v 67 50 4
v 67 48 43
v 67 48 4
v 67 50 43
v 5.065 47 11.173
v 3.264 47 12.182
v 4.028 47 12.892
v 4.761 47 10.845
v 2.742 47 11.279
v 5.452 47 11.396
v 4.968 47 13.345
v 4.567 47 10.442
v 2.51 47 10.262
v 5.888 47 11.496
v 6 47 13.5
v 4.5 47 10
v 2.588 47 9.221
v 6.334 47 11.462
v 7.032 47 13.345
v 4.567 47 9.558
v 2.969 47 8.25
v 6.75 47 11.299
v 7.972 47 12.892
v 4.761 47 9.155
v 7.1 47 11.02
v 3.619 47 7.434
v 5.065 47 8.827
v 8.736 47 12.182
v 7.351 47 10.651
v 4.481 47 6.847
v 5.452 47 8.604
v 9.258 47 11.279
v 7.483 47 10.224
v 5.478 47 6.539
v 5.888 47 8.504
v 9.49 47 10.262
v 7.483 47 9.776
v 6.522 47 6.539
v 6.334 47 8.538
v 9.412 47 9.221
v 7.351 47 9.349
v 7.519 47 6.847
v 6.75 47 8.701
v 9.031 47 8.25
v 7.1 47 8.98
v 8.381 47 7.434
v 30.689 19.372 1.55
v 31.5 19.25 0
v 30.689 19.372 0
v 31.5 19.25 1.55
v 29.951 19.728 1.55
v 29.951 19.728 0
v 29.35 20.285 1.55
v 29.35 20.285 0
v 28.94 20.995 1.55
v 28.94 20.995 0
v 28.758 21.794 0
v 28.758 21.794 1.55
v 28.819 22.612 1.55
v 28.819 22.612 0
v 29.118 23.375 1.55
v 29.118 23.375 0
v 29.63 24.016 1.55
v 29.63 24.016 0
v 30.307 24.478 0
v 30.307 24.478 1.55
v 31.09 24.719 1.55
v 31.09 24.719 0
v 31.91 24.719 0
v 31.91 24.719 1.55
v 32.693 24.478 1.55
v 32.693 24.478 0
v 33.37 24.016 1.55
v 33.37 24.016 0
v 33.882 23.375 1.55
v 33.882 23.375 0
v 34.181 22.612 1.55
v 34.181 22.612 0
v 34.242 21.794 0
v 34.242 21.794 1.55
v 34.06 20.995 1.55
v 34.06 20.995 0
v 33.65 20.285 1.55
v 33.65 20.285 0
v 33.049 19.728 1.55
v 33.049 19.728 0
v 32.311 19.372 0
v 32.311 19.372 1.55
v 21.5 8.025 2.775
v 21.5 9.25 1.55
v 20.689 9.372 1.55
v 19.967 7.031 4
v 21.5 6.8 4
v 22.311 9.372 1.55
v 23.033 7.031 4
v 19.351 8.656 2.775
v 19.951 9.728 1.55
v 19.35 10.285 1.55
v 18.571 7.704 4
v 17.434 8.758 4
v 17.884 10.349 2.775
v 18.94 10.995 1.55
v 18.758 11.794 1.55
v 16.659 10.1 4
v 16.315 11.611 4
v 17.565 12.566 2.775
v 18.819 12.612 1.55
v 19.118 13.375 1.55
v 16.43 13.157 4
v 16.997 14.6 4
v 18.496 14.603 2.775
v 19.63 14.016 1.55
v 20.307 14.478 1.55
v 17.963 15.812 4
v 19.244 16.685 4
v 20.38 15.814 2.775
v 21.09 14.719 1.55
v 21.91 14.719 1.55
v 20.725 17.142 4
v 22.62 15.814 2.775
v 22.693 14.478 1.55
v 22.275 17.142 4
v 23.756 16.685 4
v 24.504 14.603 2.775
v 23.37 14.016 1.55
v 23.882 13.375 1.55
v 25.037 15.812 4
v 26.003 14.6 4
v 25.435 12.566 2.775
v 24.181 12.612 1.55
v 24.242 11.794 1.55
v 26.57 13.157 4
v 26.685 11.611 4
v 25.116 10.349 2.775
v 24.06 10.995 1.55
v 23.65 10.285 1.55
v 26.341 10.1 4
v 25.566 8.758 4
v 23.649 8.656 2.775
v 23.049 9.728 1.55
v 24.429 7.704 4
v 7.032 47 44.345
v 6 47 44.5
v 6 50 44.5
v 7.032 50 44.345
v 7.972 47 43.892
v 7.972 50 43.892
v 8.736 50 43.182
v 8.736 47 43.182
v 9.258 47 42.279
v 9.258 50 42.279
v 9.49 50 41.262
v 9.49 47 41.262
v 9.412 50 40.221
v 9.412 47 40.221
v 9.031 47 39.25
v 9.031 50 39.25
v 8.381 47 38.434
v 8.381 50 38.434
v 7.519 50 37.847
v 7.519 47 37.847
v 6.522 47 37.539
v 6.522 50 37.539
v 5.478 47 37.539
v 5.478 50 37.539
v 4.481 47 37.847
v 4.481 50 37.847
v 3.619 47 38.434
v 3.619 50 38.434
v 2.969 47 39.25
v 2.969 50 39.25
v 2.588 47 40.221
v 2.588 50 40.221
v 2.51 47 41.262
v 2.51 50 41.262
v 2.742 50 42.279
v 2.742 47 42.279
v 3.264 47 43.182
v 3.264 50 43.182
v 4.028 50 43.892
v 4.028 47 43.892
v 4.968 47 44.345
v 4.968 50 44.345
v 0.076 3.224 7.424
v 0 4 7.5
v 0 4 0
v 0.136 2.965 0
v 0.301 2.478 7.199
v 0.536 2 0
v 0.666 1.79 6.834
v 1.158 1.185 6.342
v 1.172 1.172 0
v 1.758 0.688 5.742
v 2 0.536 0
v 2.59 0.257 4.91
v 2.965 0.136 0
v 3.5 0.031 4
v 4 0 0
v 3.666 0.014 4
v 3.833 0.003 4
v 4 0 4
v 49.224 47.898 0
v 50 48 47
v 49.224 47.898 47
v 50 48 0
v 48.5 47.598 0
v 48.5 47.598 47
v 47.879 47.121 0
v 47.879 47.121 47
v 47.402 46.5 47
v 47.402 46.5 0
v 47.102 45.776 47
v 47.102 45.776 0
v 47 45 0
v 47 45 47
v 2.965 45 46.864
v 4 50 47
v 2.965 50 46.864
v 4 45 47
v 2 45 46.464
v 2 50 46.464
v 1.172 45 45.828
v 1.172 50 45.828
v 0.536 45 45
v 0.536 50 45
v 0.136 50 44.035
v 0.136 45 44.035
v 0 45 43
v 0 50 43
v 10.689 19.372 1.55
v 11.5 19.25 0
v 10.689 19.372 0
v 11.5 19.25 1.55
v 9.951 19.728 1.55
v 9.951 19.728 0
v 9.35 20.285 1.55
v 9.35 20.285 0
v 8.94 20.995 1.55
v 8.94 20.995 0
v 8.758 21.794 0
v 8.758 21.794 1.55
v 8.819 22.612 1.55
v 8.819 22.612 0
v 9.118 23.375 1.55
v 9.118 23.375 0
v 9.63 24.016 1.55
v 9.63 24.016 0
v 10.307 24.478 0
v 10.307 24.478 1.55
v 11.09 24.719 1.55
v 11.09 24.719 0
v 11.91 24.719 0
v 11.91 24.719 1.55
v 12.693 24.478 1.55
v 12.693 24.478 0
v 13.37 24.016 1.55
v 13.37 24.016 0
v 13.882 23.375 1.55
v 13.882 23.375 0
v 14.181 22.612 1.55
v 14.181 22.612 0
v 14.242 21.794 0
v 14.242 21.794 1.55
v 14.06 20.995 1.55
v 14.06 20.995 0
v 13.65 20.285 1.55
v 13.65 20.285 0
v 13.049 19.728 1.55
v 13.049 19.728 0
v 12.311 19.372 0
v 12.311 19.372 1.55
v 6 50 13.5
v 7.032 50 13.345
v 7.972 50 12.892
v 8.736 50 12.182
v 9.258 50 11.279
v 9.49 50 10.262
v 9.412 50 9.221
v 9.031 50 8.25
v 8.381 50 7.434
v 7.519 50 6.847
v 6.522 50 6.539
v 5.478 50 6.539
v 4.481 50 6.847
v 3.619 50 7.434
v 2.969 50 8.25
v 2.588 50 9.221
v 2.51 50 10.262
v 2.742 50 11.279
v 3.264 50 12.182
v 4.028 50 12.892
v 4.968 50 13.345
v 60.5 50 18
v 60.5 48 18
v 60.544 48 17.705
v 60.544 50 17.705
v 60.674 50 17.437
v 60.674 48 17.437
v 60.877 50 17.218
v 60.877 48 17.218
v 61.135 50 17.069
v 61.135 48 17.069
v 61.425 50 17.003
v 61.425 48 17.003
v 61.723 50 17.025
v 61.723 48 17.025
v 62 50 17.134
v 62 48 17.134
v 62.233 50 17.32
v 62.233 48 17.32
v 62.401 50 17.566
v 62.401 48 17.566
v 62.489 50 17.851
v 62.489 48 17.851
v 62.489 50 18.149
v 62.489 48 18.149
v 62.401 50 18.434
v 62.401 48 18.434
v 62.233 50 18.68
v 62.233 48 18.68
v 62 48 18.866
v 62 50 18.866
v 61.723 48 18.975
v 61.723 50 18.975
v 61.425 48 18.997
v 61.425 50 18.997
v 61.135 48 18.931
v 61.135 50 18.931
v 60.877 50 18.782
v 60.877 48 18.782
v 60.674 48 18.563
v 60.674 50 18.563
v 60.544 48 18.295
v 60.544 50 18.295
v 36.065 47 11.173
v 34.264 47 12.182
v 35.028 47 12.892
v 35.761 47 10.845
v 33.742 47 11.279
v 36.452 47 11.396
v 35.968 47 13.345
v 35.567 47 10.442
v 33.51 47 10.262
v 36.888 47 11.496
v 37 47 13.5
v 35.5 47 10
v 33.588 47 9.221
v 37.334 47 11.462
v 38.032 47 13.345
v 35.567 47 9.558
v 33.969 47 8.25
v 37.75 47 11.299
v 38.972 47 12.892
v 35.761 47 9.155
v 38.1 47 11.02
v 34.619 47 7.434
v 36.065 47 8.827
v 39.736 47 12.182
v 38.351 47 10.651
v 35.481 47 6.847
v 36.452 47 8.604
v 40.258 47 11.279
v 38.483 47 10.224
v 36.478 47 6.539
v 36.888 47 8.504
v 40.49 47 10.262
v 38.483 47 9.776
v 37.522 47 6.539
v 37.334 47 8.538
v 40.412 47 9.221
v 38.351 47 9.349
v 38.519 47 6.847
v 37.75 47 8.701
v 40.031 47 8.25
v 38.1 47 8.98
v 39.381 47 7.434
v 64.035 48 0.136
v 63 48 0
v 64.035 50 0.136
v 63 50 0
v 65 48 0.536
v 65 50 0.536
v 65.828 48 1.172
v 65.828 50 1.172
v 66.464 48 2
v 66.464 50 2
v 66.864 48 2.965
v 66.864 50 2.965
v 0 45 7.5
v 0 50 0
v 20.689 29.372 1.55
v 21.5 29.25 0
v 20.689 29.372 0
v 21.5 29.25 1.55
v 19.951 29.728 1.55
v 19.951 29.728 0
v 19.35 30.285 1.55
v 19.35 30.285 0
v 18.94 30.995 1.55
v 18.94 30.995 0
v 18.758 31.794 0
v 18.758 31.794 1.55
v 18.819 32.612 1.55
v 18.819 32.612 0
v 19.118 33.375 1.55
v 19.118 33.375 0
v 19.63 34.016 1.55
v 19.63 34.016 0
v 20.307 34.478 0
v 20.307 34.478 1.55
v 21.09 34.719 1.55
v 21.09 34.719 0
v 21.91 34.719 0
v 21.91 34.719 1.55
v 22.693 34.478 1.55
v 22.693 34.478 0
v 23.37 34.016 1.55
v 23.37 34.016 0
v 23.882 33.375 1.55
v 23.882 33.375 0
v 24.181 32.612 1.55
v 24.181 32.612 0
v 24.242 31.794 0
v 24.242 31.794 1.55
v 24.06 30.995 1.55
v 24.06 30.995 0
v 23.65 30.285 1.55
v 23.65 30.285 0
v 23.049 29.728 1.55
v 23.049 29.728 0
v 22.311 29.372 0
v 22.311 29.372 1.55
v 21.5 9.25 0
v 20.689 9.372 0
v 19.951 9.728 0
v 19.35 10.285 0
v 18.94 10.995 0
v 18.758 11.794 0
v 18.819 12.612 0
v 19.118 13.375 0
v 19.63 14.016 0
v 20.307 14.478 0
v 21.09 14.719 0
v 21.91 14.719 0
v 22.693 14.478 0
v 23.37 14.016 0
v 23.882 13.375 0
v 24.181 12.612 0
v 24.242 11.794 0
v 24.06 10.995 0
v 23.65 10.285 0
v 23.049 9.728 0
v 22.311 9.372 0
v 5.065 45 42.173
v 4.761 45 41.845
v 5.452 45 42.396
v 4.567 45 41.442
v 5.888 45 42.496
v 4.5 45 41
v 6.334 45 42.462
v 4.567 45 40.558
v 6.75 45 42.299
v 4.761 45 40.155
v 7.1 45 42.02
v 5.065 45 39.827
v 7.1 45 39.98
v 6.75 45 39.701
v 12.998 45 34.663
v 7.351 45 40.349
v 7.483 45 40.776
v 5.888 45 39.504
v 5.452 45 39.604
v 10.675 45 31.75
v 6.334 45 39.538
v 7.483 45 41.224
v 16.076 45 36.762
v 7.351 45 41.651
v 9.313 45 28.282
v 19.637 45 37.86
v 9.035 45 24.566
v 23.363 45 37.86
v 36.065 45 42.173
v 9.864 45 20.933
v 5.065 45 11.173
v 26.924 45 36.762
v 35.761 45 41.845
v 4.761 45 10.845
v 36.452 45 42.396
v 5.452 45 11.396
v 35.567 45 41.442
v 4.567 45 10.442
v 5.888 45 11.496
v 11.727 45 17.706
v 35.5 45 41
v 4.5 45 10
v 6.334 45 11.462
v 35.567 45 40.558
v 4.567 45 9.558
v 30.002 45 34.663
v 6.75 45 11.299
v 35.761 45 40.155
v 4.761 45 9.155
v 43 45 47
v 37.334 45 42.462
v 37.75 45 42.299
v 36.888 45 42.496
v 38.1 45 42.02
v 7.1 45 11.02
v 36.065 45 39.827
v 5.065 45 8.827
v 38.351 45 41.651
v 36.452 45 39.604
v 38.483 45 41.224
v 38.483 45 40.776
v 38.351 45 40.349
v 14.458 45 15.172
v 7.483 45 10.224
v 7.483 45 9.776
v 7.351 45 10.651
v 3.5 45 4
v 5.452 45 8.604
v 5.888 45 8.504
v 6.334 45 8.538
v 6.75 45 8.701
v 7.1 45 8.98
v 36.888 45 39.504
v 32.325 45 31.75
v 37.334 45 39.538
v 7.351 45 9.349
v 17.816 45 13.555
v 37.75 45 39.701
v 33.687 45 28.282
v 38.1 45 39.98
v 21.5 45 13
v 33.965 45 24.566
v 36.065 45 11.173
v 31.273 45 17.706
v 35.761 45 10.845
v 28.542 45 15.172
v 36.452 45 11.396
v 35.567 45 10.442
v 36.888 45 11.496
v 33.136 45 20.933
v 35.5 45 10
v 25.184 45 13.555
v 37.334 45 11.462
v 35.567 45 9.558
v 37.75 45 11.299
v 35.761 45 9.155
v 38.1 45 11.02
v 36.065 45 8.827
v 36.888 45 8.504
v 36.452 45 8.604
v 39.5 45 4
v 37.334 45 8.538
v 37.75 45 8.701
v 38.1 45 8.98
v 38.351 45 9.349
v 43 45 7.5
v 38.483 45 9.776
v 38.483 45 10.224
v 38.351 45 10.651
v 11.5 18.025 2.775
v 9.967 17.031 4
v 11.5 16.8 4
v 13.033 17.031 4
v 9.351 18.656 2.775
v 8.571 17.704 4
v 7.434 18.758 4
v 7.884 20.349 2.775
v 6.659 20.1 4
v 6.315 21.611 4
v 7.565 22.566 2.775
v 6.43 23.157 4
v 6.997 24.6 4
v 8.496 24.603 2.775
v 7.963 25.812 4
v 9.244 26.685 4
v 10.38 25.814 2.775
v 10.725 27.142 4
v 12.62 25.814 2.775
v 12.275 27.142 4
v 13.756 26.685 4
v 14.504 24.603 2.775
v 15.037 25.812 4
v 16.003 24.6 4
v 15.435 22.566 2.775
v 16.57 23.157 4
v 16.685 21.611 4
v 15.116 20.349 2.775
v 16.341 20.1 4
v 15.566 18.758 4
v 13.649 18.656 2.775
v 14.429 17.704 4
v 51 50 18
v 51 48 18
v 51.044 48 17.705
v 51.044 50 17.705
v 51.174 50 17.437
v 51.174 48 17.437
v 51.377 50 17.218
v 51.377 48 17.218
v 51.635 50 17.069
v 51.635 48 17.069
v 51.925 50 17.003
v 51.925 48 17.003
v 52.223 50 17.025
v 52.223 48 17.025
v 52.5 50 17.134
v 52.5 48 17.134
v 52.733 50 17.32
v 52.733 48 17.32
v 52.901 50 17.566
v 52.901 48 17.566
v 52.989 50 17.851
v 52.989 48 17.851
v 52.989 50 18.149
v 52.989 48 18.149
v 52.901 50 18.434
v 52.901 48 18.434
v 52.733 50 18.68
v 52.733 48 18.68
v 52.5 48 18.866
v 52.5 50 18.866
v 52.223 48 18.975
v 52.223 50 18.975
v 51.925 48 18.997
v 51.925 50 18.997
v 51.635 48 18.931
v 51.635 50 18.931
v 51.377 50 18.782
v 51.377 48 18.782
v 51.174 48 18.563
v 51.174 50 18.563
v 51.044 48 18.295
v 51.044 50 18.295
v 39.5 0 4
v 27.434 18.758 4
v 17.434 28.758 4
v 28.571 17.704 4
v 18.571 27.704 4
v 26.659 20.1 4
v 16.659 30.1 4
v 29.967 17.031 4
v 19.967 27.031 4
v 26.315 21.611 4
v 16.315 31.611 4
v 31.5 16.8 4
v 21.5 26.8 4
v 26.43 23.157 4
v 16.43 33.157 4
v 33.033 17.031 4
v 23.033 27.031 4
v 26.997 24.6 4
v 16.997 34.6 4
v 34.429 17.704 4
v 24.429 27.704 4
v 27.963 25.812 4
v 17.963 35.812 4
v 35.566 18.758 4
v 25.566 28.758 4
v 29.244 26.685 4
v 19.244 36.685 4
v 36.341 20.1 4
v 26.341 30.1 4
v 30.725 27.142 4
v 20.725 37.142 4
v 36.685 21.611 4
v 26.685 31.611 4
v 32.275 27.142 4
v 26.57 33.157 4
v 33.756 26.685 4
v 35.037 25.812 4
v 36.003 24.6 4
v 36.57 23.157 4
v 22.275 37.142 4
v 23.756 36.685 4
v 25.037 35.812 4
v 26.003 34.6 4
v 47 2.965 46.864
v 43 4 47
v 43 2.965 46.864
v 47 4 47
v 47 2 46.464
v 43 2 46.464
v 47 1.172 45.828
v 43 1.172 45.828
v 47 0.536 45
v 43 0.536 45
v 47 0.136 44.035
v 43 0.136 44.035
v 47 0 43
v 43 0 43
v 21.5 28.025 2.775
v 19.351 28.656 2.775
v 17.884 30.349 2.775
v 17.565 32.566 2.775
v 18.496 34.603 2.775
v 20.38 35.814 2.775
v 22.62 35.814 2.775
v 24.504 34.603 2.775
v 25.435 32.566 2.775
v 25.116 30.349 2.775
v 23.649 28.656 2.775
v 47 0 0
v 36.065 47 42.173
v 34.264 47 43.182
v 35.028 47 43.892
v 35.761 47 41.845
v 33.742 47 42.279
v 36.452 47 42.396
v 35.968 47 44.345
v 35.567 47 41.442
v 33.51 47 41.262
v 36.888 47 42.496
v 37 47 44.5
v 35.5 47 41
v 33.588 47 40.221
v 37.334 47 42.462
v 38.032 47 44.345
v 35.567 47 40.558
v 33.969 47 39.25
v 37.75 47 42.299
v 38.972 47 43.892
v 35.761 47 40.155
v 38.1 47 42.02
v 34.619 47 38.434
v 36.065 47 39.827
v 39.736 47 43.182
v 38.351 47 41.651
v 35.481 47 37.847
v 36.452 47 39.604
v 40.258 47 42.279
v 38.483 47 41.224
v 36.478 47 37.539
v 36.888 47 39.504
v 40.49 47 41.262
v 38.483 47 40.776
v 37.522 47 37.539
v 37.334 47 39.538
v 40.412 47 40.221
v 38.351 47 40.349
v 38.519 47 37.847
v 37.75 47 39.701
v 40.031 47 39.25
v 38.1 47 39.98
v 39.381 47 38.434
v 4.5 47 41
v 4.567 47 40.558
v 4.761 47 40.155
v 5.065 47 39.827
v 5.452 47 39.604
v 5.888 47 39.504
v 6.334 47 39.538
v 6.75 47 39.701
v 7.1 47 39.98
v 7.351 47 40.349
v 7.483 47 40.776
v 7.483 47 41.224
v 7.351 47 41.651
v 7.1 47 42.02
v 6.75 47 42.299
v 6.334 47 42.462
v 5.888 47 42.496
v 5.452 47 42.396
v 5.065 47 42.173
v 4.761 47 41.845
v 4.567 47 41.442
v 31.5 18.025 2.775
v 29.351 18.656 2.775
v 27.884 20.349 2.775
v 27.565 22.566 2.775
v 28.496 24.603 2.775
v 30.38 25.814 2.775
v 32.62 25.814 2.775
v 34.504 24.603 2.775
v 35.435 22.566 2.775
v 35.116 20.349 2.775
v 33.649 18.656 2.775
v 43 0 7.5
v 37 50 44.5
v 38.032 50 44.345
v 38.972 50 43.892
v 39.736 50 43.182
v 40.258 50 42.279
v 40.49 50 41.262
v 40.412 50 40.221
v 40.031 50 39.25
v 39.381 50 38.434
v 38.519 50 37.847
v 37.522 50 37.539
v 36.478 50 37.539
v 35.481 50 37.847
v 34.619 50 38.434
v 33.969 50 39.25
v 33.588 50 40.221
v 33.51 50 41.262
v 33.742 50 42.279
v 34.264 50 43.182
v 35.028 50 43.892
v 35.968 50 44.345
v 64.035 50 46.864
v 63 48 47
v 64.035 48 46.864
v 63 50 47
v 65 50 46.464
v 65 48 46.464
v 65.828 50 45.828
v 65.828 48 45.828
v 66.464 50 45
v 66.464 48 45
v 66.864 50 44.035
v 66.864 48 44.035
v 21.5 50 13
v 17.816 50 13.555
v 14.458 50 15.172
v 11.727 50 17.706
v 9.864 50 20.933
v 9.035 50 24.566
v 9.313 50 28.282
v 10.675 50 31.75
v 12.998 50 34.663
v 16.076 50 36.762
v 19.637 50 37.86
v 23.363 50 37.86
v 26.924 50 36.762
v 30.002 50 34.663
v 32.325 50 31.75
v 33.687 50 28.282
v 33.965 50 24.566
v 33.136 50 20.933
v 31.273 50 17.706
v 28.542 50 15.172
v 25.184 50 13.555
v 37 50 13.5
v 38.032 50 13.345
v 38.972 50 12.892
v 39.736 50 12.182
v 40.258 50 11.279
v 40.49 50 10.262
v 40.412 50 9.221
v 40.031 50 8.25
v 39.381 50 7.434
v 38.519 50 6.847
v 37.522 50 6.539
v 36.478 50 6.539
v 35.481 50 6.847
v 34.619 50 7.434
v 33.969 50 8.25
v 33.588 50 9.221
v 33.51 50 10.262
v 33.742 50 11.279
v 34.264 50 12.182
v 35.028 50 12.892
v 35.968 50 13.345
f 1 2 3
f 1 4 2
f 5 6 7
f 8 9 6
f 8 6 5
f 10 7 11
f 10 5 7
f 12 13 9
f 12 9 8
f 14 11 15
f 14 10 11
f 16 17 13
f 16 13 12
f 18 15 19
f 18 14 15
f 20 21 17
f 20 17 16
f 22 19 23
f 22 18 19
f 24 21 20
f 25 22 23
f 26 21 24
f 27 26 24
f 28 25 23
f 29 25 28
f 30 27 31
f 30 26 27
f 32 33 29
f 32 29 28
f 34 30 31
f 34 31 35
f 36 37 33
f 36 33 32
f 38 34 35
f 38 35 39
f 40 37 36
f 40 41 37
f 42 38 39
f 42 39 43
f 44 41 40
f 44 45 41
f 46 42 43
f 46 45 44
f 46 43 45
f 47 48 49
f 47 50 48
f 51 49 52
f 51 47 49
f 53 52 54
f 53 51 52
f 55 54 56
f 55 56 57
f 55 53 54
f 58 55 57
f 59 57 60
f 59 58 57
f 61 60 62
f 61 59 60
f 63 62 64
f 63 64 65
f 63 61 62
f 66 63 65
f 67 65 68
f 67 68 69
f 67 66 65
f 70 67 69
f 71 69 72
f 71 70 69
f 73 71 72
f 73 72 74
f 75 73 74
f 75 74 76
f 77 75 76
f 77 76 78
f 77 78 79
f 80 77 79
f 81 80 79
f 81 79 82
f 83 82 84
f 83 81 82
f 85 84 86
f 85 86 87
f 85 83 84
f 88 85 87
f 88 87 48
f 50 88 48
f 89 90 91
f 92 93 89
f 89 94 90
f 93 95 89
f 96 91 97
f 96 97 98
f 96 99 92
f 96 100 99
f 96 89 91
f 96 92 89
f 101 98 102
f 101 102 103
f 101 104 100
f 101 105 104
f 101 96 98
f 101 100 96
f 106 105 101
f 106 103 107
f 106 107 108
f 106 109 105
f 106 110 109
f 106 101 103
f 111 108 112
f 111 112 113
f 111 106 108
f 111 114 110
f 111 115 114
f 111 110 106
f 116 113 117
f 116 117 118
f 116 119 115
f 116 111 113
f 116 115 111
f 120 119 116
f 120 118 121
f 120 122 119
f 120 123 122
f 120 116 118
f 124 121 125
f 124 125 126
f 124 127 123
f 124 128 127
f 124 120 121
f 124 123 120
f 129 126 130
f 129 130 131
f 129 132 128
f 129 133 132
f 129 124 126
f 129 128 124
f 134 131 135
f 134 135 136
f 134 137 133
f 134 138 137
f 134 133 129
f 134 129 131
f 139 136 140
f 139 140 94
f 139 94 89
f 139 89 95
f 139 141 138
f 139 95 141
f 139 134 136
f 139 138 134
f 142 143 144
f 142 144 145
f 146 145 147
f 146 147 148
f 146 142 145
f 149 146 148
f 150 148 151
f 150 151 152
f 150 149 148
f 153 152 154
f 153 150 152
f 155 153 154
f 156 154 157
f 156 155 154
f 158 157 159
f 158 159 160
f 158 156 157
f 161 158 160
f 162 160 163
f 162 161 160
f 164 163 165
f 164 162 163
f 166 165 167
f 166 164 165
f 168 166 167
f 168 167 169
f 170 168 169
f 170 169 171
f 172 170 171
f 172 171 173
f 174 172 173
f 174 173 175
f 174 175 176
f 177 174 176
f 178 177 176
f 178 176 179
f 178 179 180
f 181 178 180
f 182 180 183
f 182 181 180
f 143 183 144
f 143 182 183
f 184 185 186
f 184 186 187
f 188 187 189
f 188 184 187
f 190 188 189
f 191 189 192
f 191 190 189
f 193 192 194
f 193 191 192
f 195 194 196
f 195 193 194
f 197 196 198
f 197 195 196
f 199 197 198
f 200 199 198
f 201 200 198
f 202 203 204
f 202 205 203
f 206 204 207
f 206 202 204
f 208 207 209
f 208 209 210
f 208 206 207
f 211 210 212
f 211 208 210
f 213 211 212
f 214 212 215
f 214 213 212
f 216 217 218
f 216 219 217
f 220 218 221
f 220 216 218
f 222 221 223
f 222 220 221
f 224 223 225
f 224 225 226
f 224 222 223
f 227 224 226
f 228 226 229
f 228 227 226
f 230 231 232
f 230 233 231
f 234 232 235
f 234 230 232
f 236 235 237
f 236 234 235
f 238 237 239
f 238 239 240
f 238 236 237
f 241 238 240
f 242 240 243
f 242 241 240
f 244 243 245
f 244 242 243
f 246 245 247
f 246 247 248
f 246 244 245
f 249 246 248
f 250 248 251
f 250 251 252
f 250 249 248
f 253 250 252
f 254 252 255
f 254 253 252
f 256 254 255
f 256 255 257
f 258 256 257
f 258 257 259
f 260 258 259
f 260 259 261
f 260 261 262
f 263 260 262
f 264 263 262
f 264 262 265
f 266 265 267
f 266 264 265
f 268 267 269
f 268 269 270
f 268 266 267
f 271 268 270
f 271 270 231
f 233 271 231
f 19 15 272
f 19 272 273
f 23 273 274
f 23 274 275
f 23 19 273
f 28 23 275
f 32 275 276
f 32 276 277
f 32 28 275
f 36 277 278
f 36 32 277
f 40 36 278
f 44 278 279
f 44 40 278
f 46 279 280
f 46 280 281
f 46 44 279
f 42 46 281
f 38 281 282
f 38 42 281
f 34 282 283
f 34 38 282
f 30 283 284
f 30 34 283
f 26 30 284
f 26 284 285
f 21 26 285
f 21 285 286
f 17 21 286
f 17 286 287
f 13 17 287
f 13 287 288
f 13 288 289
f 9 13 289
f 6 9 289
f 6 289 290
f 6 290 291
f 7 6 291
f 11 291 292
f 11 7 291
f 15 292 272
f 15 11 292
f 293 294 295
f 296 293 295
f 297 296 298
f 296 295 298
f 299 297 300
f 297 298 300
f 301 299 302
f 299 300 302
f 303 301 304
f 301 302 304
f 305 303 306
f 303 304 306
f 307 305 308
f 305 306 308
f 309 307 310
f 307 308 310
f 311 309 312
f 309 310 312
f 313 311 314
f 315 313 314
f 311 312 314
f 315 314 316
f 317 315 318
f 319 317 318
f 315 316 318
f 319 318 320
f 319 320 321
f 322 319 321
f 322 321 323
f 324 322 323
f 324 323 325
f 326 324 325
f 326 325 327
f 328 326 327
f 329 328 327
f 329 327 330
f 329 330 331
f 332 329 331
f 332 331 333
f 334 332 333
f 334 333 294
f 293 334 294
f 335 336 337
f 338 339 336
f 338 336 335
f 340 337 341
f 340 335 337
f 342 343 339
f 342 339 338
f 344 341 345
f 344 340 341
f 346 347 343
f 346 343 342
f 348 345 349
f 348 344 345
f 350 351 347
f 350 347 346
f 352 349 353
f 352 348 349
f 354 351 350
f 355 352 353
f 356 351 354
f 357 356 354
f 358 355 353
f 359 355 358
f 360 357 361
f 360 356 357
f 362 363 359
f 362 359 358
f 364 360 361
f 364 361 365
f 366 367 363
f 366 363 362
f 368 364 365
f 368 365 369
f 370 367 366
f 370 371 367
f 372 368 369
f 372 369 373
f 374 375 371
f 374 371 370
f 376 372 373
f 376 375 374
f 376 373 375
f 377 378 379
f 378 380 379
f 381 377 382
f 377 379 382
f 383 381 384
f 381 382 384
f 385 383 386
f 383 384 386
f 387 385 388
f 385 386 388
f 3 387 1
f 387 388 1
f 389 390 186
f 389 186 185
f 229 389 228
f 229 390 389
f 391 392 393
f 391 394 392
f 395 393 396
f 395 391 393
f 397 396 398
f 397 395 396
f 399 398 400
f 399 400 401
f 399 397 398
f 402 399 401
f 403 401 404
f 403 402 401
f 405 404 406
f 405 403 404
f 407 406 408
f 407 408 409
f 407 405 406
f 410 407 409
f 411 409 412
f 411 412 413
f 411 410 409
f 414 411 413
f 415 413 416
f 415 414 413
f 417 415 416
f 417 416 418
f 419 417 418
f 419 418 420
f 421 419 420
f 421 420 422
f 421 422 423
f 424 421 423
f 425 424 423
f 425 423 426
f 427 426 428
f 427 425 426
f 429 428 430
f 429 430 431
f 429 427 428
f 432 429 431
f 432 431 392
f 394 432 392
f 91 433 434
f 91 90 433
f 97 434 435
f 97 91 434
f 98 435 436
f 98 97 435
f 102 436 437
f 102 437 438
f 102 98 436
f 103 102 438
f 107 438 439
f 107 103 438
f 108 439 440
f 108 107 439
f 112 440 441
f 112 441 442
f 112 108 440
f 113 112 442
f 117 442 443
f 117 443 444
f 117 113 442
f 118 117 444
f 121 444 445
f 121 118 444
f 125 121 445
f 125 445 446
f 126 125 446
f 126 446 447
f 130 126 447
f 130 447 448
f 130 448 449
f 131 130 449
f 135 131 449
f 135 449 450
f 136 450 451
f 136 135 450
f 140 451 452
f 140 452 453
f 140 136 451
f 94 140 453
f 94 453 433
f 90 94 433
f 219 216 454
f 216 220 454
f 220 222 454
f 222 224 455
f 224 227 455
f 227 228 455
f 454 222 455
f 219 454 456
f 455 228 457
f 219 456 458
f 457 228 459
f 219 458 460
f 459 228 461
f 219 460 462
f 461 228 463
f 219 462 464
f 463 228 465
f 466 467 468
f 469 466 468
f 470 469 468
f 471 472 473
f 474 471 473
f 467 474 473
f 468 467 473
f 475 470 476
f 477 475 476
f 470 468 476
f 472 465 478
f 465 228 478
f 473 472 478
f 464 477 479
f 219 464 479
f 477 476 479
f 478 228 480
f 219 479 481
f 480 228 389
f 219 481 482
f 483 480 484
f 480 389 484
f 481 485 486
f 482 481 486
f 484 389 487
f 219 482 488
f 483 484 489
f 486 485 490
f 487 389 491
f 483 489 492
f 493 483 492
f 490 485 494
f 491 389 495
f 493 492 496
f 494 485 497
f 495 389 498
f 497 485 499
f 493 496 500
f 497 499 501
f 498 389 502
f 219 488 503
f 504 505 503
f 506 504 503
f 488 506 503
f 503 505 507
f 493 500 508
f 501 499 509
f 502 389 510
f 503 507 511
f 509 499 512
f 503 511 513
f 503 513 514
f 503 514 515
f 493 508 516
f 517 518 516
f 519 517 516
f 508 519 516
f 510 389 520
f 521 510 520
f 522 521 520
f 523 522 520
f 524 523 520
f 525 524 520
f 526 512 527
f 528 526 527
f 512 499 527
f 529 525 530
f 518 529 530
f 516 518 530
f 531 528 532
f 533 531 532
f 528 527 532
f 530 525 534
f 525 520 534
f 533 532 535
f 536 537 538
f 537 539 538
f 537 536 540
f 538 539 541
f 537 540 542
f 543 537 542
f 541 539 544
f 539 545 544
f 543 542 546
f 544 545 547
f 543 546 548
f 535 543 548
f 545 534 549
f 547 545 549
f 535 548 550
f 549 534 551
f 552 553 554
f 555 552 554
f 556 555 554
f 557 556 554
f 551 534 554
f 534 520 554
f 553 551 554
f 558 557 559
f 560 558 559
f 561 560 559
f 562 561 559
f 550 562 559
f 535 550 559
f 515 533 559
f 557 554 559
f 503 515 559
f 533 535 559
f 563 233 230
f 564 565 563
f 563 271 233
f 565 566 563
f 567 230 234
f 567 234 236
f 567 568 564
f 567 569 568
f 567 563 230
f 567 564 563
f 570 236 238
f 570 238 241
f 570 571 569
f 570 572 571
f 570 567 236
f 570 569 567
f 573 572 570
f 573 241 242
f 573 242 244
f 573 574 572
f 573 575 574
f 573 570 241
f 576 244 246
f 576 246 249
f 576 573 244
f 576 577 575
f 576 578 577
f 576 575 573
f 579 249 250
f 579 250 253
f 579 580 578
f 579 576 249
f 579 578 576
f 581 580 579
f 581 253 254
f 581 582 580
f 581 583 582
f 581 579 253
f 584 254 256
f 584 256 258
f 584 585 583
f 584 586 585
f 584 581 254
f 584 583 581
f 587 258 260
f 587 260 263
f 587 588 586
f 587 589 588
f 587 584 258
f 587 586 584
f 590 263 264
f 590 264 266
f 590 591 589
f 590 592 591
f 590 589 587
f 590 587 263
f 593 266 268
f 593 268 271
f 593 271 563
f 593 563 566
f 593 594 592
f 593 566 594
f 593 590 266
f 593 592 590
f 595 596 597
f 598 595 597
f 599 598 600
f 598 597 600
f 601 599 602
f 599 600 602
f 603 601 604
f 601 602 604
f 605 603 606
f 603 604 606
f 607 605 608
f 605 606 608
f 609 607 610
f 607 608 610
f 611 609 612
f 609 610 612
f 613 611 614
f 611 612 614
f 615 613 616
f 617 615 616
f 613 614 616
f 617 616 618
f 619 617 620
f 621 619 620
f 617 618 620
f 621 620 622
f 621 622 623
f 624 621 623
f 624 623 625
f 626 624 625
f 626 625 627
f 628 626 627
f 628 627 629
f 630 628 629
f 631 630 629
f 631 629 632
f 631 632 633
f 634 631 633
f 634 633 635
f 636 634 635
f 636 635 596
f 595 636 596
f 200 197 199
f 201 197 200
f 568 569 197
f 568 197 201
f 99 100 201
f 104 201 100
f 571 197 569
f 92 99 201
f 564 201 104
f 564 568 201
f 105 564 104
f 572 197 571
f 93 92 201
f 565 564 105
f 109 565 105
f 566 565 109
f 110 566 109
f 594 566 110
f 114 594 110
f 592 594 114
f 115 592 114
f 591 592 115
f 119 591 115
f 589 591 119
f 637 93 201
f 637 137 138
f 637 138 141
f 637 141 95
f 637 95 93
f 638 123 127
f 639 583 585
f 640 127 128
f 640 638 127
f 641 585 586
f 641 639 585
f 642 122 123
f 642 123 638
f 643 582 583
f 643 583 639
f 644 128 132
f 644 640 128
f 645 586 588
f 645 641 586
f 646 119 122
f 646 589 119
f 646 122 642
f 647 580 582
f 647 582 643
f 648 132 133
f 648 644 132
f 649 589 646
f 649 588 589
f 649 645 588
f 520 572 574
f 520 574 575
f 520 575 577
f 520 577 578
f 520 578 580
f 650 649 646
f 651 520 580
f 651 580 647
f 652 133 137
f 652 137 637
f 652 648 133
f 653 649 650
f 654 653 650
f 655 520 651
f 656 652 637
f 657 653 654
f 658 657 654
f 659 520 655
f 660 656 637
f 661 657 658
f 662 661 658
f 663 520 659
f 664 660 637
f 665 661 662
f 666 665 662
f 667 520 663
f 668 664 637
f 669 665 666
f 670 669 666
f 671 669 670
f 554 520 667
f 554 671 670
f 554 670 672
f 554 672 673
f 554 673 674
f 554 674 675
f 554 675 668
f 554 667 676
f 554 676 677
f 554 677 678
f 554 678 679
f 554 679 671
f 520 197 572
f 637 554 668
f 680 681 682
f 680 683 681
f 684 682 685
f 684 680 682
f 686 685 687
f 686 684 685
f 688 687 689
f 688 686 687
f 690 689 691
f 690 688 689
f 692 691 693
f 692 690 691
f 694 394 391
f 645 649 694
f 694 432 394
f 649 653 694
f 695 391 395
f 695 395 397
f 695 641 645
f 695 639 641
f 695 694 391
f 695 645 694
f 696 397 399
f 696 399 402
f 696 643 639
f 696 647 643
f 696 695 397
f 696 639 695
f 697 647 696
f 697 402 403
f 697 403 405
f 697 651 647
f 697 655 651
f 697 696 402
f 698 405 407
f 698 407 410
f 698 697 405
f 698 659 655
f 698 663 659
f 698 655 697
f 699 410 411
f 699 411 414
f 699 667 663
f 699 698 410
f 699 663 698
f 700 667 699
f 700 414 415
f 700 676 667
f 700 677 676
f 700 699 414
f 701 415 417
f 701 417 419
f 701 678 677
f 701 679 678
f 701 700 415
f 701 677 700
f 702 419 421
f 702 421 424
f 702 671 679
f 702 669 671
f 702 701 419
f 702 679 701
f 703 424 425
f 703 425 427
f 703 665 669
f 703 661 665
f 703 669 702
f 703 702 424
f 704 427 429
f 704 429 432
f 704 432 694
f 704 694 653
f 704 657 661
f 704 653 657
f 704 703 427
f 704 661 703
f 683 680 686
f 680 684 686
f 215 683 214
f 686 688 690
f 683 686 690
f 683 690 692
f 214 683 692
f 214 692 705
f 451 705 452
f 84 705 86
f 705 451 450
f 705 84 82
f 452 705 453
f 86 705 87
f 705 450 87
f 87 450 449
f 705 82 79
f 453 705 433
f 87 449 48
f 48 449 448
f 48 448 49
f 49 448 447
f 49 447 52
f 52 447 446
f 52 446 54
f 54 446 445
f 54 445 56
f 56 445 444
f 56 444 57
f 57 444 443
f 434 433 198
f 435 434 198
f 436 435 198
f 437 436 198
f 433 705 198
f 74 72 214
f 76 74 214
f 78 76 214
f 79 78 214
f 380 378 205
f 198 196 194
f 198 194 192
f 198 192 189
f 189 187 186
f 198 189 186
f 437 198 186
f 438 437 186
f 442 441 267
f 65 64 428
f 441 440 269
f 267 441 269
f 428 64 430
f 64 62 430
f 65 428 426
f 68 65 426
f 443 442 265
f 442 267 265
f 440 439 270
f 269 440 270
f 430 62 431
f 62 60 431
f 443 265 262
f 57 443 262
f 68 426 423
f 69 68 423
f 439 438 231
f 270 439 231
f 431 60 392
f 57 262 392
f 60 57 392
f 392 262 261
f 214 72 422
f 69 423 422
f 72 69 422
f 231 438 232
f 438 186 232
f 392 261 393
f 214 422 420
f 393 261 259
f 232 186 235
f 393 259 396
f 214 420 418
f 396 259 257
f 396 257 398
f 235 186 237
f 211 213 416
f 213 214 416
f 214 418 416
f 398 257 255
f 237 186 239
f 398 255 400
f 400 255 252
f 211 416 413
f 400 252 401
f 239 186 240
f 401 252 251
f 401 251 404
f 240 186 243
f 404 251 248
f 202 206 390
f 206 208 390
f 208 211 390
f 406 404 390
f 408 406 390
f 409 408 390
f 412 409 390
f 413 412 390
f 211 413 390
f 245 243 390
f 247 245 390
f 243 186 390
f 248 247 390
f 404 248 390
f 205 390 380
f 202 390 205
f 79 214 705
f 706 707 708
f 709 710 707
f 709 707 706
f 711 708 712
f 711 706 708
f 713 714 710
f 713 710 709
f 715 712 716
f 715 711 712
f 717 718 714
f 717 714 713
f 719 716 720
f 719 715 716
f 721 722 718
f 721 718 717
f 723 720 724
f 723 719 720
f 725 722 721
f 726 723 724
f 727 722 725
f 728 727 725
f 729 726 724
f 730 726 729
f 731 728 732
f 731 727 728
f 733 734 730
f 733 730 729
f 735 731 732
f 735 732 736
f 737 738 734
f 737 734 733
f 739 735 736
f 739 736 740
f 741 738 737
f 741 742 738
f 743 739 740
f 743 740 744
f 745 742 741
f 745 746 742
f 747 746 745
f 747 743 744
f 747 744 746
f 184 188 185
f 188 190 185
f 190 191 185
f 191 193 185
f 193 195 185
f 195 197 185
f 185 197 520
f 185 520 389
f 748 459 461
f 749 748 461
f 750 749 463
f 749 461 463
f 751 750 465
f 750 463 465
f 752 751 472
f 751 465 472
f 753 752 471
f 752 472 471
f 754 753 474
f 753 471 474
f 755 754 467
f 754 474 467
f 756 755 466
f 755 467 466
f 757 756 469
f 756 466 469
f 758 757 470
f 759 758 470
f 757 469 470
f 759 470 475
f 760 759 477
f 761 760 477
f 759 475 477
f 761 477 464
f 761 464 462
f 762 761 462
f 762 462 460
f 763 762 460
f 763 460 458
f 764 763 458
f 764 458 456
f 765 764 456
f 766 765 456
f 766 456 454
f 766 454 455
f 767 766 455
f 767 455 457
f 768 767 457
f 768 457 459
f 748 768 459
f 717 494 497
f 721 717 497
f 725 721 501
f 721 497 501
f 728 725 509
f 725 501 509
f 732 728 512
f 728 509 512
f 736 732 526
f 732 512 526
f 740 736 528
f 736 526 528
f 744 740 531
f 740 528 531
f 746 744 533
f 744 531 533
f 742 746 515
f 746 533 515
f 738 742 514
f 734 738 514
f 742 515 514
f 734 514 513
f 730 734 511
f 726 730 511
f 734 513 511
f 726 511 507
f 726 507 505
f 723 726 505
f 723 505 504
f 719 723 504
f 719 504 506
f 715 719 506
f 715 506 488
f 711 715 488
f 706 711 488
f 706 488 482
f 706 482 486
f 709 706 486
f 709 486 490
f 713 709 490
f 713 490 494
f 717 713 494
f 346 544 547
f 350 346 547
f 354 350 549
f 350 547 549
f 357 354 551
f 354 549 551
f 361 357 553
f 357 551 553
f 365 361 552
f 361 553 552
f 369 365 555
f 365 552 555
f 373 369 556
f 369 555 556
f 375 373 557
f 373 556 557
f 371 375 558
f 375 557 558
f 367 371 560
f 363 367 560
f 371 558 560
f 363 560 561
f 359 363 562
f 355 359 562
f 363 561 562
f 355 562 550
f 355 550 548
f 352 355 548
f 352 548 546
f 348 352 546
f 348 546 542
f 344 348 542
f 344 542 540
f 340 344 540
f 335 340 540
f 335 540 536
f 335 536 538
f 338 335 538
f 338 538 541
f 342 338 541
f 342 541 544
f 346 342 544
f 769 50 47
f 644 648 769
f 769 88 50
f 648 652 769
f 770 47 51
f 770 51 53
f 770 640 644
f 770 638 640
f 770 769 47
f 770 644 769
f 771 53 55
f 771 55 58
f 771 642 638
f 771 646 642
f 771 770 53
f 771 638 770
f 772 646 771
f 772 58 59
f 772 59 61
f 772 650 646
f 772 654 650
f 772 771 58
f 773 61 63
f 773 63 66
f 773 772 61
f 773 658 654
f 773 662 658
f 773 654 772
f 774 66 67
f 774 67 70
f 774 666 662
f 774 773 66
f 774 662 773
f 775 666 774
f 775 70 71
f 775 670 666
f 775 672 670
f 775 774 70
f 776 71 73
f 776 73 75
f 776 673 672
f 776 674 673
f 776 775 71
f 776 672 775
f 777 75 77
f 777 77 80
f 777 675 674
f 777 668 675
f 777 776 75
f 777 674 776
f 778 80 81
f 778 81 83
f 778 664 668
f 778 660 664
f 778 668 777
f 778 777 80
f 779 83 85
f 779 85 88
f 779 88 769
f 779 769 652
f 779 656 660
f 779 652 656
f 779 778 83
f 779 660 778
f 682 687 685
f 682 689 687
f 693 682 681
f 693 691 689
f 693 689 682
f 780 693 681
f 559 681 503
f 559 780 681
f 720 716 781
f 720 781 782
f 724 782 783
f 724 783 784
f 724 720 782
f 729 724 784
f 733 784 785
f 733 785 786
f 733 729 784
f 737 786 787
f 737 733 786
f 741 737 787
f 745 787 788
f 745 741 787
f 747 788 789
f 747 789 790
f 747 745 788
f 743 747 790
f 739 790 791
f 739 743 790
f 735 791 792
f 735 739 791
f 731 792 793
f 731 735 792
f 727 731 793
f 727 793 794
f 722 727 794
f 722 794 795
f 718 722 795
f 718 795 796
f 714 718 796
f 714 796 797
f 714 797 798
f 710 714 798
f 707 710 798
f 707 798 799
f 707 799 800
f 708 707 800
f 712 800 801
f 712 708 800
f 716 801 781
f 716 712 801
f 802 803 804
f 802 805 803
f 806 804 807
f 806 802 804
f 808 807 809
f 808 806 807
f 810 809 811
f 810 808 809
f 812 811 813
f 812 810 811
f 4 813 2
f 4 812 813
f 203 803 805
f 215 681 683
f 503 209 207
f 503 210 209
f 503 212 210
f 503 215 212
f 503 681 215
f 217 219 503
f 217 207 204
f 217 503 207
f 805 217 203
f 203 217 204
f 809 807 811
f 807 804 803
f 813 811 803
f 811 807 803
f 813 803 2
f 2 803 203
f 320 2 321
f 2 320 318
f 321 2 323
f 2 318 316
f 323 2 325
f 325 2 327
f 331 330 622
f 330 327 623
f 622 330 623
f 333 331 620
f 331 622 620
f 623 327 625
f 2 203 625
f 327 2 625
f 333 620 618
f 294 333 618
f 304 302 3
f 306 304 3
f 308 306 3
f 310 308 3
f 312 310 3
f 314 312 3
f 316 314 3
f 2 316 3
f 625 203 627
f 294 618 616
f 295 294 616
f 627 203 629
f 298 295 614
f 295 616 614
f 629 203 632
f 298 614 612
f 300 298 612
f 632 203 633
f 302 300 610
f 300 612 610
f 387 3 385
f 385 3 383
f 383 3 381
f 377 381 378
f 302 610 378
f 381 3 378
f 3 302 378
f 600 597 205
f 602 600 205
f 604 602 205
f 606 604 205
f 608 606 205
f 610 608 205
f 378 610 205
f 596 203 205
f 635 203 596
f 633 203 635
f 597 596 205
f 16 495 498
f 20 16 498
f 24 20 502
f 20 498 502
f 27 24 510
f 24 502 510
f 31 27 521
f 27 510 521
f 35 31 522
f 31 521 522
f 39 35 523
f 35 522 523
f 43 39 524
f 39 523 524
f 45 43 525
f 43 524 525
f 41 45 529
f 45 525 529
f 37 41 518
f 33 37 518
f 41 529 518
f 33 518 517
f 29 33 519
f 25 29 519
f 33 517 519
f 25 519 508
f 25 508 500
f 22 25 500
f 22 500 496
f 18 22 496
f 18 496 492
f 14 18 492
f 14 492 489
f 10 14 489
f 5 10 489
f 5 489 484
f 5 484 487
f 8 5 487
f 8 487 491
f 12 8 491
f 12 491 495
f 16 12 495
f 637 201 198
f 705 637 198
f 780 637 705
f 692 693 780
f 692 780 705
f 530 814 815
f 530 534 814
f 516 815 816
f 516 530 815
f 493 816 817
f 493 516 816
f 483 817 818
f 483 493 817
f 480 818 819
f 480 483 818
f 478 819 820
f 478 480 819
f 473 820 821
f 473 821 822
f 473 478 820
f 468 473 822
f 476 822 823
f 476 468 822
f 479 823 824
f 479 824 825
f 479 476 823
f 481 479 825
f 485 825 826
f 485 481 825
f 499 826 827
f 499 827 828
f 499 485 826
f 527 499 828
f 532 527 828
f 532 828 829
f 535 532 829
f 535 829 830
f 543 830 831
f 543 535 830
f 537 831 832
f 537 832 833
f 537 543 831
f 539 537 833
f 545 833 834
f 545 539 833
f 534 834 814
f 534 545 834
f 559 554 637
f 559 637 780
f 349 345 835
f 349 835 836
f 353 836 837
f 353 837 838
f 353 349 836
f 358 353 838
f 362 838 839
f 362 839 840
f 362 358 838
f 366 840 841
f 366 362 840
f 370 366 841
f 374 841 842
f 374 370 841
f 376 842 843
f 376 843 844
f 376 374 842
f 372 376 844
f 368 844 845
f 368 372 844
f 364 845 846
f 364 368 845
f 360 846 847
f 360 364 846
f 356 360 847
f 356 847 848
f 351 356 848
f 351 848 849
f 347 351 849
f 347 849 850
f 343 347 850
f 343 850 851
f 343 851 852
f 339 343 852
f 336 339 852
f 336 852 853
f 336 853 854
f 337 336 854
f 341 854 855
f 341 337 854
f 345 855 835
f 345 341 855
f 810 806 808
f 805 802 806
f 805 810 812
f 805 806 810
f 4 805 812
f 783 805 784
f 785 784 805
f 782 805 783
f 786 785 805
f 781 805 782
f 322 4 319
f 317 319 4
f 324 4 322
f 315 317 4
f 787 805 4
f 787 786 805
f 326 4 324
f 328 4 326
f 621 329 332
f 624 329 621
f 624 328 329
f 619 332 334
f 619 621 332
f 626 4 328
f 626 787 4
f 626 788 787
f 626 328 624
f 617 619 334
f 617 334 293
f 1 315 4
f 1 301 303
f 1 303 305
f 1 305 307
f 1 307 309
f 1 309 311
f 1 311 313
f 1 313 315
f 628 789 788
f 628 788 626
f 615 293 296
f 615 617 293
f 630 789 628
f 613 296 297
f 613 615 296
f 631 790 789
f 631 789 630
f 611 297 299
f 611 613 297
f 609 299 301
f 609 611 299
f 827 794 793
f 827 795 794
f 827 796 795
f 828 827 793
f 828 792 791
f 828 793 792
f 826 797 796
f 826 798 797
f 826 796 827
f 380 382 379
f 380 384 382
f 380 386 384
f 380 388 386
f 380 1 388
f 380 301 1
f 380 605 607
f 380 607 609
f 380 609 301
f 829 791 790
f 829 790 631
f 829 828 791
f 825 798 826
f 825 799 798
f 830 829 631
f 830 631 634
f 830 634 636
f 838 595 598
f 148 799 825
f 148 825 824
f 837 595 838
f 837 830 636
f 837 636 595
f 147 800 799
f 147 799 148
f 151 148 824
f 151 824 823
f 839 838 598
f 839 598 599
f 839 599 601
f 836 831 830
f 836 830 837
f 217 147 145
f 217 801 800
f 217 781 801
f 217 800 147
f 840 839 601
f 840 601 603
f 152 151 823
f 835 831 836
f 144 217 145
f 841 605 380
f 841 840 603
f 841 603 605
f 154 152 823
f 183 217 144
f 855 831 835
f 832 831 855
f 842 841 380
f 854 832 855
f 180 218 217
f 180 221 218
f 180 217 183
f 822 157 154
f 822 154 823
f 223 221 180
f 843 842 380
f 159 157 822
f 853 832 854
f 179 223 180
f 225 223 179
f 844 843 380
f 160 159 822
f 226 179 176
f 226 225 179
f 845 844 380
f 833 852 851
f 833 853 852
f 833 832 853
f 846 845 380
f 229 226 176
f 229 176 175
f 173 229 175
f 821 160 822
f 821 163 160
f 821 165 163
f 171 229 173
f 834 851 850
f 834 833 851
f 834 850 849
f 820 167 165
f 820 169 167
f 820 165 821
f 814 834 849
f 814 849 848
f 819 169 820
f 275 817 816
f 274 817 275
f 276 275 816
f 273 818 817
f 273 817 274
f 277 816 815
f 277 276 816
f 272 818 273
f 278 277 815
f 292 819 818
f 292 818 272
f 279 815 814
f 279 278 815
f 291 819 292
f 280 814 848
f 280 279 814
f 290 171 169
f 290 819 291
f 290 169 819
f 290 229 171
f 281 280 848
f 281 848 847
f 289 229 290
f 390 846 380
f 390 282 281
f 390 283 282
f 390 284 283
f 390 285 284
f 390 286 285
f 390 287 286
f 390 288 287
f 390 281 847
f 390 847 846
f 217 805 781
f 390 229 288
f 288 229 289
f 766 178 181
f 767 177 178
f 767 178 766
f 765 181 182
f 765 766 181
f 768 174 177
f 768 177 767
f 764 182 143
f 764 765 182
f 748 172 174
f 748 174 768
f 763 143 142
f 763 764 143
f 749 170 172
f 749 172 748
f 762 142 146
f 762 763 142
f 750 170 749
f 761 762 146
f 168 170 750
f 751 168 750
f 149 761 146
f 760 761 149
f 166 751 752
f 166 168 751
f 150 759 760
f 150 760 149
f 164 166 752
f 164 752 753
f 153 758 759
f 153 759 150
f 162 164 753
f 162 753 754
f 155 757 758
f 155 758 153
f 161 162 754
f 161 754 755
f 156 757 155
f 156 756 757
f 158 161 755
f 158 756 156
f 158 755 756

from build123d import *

# Parameters (mm, degrees)
SKETCH_2_W                  = 47
SKETCH_2_H                  = 47
EXTRUDE_1_DEPTH             = 4
SKETCH_3_W                  = 47
SKETCH_3_H                  = 2
EXTRUDE_2_DEPTH             = 43
SKETCH_4_W                  = 4
SKETCH_4_H                  = 45
EXTRUDE_3_DEPTH             = 43
SKETCH_5_R                  = 12.5
CUT_EXTRUDE_1_DEPTH         = 81.268300094
M3X0_5_2_D                  = 3
HOLE_WIZARD_M5_1_AT_2_COUNT = 2
HOLE_WIZARD_M5_1_AT_2_PITCH = 14.142135624
HOLE_WIZARD_M5_1_AT_3_COUNT = 2
HOLE_WIZARD_M5_1_AT_3_PITCH = 20
HOLE_WIZARD_M5_1_AT_4_COUNT = 2
HOLE_WIZARD_M5_1_AT_4_PITCH = 14.142135624
EXTRUDE_6_DEPTH             = 45
EXTRUDE_7_DEPTH             = 45
SKETCH_23_W                 = 67
SKETCH_23_H                 = 47
SKETCH_23_R                 = 3.5
SKETCH_23_R_2               = 12.5
EXTRUDE_10_DEPTH            = 3
M2X0_4_1_D                  = 2
SKETCH_27_W                 = 47
SKETCH_27_H                 = 1
CUT_EXTRUDE_2_DEPTH         = 20
FILLET_1_R                  = 2.5
FILLET_2_R                  = 4
SKETCH_29_W                 = 47
SKETCH_29_H                 = 2
EXTRUDE_11_DEPTH            = 20
FILLET_5_R                  = 4
FILLET_6_R                  = 3
M2X0_4_2_D                  = 2
SKETCH_34_W                 = 20
SKETCH_34_H                 = 47
CUT_EXTRUDE_5_DEPTH         = 20
FILLET_7_R                  = 4


with BuildPart() as part:
    # ｽｹｯﾁ2 → ﾎﾞｽ - 押し出し1 (new body)
    with BuildSketch(Plane.XY):
        with Locations((23.5, 23.5)):
            Rectangle(SKETCH_2_W, SKETCH_2_H)
    extrude(amount=EXTRUDE_1_DEPTH)

    # ｽｹｯﾁ3 → ﾎﾞｽ - 押し出し2 (add)
    with BuildSketch(Plane.XY.offset(4)):
        with Locations((23.5, 46)):
            Rectangle(SKETCH_3_W, SKETCH_3_H)
    extrude(amount=EXTRUDE_2_DEPTH)

    # ｽｹｯﾁ4 → ﾎﾞｽ - 押し出し3 (add)
    with BuildSketch(Plane.XY.offset(4)):
        with Locations((45, 22.5)):
            Rectangle(SKETCH_4_W, SKETCH_4_H)
    extrude(amount=EXTRUDE_3_DEPTH)

    # ｽｹｯﾁ5 → ｶｯﾄ - 押し出し1 (cut, through all)
    with BuildSketch(Plane.XZ.offset(-45)):
        with Locations(Location((21.5, 25.5, 0), (0, 0, 270))):
            Circle(SKETCH_5_R)
    extrude(amount=-CUT_EXTRUDE_1_DEPTH, mode=Mode.SUBTRACT)

    # M3x0.5 ねじ穴2 (through all)
    with Locations(Plane(origin=(0, 47, 0), x_dir=(1, 0, 0), z_dir=(0, 1, 0))):
        with Locations((6, -10), (37, -10), (37, -41), (6, -41)):
            Hole(M3X0_5_2_D / 2)

    # ｽｹｯﾁ14 → M5 平皿頭ねじ用皿穴1 (revolve, cut)
    with BuildSketch(Plane(origin=(11.5, 22, 4), x_dir=(0, -1, 0), z_dir=(1, 0, 0))):
        Polygon((0, 0), (0, 4), (2.75, 4), (2.75, 2.45), (5.2, 0), align=None)
    hole_wizard_m5_1 = revolve(axis=Axis((11.5, 22, 10.35), (0, 0, -1)), mode=Mode.SUBTRACT)

    # M5 平皿頭ねじ用皿穴1 at 2: M5 平皿頭ねじ用皿穴1 ×2
    with Locations(*[Vector(0.7071067811865475, 0.7071067811865476, 0) * (i * HOLE_WIZARD_M5_1_AT_2_PITCH) for i in range(1, HOLE_WIZARD_M5_1_AT_2_COUNT)]):
        add(hole_wizard_m5_1, mode=Mode.SUBTRACT)

    # M5 平皿頭ねじ用皿穴1 at 3: M5 平皿頭ねじ用皿穴1 ×2
    with Locations(*[(i * HOLE_WIZARD_M5_1_AT_3_PITCH, 0, 0) for i in range(1, HOLE_WIZARD_M5_1_AT_3_COUNT)]):
        add(hole_wizard_m5_1, mode=Mode.SUBTRACT)

    # M5 平皿頭ねじ用皿穴1 at 4: M5 平皿頭ねじ用皿穴1 ×2
    with Locations(*[Vector(0.7071067811865474, -0.7071067811865478, 0) * (i * HOLE_WIZARD_M5_1_AT_4_PITCH) for i in range(1, HOLE_WIZARD_M5_1_AT_4_COUNT)]):
        add(hole_wizard_m5_1, mode=Mode.SUBTRACT)

    # ｽｹｯﾁ17 → ﾎﾞｽ - 押し出し6 (add)
    with BuildSketch(Plane.XZ.offset(-45)):
        Polygon((43, 4), (39.5, 4), (43, 7.5), align=None)
    extrude(amount=EXTRUDE_6_DEPTH)

    # ｽｹｯﾁ19 → ﾎﾞｽ - 押し出し7 (add)
    with BuildSketch(Plane.XZ.offset(-45)):
        Polygon((0, 4), (3.5, 4), (0, 7.5), align=None)
    extrude(amount=EXTRUDE_7_DEPTH)

    # ｽｹｯﾁ23 → ﾎﾞｽ - 押し出し10 (add)
    with BuildSketch(Plane(origin=(0, 47, 0), x_dir=(1, 0, 0), z_dir=(0, 1, 0))):
        with Locations((13.5, -23.5)):
            Rectangle(SKETCH_23_W, SKETCH_23_H)
        with Locations(Location((6, -10, 0), (0, 0, 270))):
            Circle(SKETCH_23_R, mode=Mode.SUBTRACT)
        with Locations(Location((6, -41, 0), (0, 0, 270))):
            Circle(SKETCH_23_R, mode=Mode.SUBTRACT)
        with Locations(Location((37, -10, 0), (0, 0, 270))):
            Circle(SKETCH_23_R, mode=Mode.SUBTRACT)
        with Locations(Location((37, -41, 0), (0, 0, 270))):
            Circle(SKETCH_23_R, mode=Mode.SUBTRACT)
        with Locations(Location((21.5, -25.5, 0), (0, 0, 90))):
            Circle(SKETCH_23_R_2, mode=Mode.SUBTRACT)
    extrude(amount=EXTRUDE_10_DEPTH)

    # M2x0.4 ねじ穴1 (through all)
    with Locations(Plane(origin=(0, 50, 0), x_dir=(1, 0, 0), z_dir=(0, 1, 0))):
        with Locations((-5, -18), (-14.5, -18)):
            Hole(M2X0_4_1_D / 2)

    # ｽｹｯﾁ27 → ｶｯﾄ - 押し出し2 (cut)
    with BuildSketch(Plane.ZY.offset(20)):
        with Locations((23.5, 47.5)):
            Rectangle(SKETCH_27_W, SKETCH_27_H)
    extrude(amount=-CUT_EXTRUDE_2_DEPTH, mode=Mode.SUBTRACT)

    # ﾌｨﾚｯﾄ1
    fillet_1_edges = [part.edges().sort_by_distance(p)[0] for p in [
        (0, 48, 23.5),
    ]]
    fillet(fillet_1_edges, radius=FILLET_1_R)

    # ﾌｨﾚｯﾄ2
    fillet_2_edges = [part.edges().sort_by_distance(p)[0] for p in [
        (-20, 49, 47),
        (-20, 49, 0),
        (0, 0, 3.75),
        (45, 0, 47),
    ]]
    fillet(fillet_2_edges, radius=FILLET_2_R)

    # ｽｹｯﾁ29 → ﾎﾞｽ - 押し出し11 (add)
    with BuildSketch(Plane(origin=(47, 0, 0), x_dir=(0, 0, -1), z_dir=(1, 0, 0))):
        with Locations((-23.5, 49)):
            Rectangle(SKETCH_29_W, SKETCH_29_H)
    extrude(amount=EXTRUDE_11_DEPTH)

    # ﾌｨﾚｯﾄ5
    fillet_5_edges = [part.edges().sort_by_distance(p)[0] for p in [
        (67, 49, 0),
        (67, 49, 47),
    ]]
    fillet(fillet_5_edges, radius=FILLET_5_R)

    # ﾌｨﾚｯﾄ6
    fillet_6_edges = [part.edges().sort_by_distance(p)[0] for p in [
        (47, 48, 23.5),
    ]]
    fillet(fillet_6_edges, radius=FILLET_6_R)

    # M2x0.4 ねじ穴2 (through all)
    with Locations(Plane(origin=(0, 50, 0), x_dir=(1, 0, 0), z_dir=(0, 1, 0))):
        with Locations((61.5, -18), (52, -18)):
            Hole(M2X0_4_2_D / 2)

    # ｽｹｯﾁ34 → ｶｯﾄ - 押し出し5 (cut)
    with BuildSketch(Plane(origin=(0, 50, 0), x_dir=(1, 0, 0), z_dir=(0, 1, 0))):
        with Locations((-10, -23.5)):
            Rectangle(SKETCH_34_W, SKETCH_34_H)
    extrude(amount=-CUT_EXTRUDE_5_DEPTH, mode=Mode.SUBTRACT)

    # ﾌｨﾚｯﾄ7
    fillet_7_edges = [part.edges().sort_by_distance(p)[0] for p in [
        (0, 47.5, 47),
    ]]
    fillet(fillet_7_edges, radius=FILLET_7_R)


solid = part.part
